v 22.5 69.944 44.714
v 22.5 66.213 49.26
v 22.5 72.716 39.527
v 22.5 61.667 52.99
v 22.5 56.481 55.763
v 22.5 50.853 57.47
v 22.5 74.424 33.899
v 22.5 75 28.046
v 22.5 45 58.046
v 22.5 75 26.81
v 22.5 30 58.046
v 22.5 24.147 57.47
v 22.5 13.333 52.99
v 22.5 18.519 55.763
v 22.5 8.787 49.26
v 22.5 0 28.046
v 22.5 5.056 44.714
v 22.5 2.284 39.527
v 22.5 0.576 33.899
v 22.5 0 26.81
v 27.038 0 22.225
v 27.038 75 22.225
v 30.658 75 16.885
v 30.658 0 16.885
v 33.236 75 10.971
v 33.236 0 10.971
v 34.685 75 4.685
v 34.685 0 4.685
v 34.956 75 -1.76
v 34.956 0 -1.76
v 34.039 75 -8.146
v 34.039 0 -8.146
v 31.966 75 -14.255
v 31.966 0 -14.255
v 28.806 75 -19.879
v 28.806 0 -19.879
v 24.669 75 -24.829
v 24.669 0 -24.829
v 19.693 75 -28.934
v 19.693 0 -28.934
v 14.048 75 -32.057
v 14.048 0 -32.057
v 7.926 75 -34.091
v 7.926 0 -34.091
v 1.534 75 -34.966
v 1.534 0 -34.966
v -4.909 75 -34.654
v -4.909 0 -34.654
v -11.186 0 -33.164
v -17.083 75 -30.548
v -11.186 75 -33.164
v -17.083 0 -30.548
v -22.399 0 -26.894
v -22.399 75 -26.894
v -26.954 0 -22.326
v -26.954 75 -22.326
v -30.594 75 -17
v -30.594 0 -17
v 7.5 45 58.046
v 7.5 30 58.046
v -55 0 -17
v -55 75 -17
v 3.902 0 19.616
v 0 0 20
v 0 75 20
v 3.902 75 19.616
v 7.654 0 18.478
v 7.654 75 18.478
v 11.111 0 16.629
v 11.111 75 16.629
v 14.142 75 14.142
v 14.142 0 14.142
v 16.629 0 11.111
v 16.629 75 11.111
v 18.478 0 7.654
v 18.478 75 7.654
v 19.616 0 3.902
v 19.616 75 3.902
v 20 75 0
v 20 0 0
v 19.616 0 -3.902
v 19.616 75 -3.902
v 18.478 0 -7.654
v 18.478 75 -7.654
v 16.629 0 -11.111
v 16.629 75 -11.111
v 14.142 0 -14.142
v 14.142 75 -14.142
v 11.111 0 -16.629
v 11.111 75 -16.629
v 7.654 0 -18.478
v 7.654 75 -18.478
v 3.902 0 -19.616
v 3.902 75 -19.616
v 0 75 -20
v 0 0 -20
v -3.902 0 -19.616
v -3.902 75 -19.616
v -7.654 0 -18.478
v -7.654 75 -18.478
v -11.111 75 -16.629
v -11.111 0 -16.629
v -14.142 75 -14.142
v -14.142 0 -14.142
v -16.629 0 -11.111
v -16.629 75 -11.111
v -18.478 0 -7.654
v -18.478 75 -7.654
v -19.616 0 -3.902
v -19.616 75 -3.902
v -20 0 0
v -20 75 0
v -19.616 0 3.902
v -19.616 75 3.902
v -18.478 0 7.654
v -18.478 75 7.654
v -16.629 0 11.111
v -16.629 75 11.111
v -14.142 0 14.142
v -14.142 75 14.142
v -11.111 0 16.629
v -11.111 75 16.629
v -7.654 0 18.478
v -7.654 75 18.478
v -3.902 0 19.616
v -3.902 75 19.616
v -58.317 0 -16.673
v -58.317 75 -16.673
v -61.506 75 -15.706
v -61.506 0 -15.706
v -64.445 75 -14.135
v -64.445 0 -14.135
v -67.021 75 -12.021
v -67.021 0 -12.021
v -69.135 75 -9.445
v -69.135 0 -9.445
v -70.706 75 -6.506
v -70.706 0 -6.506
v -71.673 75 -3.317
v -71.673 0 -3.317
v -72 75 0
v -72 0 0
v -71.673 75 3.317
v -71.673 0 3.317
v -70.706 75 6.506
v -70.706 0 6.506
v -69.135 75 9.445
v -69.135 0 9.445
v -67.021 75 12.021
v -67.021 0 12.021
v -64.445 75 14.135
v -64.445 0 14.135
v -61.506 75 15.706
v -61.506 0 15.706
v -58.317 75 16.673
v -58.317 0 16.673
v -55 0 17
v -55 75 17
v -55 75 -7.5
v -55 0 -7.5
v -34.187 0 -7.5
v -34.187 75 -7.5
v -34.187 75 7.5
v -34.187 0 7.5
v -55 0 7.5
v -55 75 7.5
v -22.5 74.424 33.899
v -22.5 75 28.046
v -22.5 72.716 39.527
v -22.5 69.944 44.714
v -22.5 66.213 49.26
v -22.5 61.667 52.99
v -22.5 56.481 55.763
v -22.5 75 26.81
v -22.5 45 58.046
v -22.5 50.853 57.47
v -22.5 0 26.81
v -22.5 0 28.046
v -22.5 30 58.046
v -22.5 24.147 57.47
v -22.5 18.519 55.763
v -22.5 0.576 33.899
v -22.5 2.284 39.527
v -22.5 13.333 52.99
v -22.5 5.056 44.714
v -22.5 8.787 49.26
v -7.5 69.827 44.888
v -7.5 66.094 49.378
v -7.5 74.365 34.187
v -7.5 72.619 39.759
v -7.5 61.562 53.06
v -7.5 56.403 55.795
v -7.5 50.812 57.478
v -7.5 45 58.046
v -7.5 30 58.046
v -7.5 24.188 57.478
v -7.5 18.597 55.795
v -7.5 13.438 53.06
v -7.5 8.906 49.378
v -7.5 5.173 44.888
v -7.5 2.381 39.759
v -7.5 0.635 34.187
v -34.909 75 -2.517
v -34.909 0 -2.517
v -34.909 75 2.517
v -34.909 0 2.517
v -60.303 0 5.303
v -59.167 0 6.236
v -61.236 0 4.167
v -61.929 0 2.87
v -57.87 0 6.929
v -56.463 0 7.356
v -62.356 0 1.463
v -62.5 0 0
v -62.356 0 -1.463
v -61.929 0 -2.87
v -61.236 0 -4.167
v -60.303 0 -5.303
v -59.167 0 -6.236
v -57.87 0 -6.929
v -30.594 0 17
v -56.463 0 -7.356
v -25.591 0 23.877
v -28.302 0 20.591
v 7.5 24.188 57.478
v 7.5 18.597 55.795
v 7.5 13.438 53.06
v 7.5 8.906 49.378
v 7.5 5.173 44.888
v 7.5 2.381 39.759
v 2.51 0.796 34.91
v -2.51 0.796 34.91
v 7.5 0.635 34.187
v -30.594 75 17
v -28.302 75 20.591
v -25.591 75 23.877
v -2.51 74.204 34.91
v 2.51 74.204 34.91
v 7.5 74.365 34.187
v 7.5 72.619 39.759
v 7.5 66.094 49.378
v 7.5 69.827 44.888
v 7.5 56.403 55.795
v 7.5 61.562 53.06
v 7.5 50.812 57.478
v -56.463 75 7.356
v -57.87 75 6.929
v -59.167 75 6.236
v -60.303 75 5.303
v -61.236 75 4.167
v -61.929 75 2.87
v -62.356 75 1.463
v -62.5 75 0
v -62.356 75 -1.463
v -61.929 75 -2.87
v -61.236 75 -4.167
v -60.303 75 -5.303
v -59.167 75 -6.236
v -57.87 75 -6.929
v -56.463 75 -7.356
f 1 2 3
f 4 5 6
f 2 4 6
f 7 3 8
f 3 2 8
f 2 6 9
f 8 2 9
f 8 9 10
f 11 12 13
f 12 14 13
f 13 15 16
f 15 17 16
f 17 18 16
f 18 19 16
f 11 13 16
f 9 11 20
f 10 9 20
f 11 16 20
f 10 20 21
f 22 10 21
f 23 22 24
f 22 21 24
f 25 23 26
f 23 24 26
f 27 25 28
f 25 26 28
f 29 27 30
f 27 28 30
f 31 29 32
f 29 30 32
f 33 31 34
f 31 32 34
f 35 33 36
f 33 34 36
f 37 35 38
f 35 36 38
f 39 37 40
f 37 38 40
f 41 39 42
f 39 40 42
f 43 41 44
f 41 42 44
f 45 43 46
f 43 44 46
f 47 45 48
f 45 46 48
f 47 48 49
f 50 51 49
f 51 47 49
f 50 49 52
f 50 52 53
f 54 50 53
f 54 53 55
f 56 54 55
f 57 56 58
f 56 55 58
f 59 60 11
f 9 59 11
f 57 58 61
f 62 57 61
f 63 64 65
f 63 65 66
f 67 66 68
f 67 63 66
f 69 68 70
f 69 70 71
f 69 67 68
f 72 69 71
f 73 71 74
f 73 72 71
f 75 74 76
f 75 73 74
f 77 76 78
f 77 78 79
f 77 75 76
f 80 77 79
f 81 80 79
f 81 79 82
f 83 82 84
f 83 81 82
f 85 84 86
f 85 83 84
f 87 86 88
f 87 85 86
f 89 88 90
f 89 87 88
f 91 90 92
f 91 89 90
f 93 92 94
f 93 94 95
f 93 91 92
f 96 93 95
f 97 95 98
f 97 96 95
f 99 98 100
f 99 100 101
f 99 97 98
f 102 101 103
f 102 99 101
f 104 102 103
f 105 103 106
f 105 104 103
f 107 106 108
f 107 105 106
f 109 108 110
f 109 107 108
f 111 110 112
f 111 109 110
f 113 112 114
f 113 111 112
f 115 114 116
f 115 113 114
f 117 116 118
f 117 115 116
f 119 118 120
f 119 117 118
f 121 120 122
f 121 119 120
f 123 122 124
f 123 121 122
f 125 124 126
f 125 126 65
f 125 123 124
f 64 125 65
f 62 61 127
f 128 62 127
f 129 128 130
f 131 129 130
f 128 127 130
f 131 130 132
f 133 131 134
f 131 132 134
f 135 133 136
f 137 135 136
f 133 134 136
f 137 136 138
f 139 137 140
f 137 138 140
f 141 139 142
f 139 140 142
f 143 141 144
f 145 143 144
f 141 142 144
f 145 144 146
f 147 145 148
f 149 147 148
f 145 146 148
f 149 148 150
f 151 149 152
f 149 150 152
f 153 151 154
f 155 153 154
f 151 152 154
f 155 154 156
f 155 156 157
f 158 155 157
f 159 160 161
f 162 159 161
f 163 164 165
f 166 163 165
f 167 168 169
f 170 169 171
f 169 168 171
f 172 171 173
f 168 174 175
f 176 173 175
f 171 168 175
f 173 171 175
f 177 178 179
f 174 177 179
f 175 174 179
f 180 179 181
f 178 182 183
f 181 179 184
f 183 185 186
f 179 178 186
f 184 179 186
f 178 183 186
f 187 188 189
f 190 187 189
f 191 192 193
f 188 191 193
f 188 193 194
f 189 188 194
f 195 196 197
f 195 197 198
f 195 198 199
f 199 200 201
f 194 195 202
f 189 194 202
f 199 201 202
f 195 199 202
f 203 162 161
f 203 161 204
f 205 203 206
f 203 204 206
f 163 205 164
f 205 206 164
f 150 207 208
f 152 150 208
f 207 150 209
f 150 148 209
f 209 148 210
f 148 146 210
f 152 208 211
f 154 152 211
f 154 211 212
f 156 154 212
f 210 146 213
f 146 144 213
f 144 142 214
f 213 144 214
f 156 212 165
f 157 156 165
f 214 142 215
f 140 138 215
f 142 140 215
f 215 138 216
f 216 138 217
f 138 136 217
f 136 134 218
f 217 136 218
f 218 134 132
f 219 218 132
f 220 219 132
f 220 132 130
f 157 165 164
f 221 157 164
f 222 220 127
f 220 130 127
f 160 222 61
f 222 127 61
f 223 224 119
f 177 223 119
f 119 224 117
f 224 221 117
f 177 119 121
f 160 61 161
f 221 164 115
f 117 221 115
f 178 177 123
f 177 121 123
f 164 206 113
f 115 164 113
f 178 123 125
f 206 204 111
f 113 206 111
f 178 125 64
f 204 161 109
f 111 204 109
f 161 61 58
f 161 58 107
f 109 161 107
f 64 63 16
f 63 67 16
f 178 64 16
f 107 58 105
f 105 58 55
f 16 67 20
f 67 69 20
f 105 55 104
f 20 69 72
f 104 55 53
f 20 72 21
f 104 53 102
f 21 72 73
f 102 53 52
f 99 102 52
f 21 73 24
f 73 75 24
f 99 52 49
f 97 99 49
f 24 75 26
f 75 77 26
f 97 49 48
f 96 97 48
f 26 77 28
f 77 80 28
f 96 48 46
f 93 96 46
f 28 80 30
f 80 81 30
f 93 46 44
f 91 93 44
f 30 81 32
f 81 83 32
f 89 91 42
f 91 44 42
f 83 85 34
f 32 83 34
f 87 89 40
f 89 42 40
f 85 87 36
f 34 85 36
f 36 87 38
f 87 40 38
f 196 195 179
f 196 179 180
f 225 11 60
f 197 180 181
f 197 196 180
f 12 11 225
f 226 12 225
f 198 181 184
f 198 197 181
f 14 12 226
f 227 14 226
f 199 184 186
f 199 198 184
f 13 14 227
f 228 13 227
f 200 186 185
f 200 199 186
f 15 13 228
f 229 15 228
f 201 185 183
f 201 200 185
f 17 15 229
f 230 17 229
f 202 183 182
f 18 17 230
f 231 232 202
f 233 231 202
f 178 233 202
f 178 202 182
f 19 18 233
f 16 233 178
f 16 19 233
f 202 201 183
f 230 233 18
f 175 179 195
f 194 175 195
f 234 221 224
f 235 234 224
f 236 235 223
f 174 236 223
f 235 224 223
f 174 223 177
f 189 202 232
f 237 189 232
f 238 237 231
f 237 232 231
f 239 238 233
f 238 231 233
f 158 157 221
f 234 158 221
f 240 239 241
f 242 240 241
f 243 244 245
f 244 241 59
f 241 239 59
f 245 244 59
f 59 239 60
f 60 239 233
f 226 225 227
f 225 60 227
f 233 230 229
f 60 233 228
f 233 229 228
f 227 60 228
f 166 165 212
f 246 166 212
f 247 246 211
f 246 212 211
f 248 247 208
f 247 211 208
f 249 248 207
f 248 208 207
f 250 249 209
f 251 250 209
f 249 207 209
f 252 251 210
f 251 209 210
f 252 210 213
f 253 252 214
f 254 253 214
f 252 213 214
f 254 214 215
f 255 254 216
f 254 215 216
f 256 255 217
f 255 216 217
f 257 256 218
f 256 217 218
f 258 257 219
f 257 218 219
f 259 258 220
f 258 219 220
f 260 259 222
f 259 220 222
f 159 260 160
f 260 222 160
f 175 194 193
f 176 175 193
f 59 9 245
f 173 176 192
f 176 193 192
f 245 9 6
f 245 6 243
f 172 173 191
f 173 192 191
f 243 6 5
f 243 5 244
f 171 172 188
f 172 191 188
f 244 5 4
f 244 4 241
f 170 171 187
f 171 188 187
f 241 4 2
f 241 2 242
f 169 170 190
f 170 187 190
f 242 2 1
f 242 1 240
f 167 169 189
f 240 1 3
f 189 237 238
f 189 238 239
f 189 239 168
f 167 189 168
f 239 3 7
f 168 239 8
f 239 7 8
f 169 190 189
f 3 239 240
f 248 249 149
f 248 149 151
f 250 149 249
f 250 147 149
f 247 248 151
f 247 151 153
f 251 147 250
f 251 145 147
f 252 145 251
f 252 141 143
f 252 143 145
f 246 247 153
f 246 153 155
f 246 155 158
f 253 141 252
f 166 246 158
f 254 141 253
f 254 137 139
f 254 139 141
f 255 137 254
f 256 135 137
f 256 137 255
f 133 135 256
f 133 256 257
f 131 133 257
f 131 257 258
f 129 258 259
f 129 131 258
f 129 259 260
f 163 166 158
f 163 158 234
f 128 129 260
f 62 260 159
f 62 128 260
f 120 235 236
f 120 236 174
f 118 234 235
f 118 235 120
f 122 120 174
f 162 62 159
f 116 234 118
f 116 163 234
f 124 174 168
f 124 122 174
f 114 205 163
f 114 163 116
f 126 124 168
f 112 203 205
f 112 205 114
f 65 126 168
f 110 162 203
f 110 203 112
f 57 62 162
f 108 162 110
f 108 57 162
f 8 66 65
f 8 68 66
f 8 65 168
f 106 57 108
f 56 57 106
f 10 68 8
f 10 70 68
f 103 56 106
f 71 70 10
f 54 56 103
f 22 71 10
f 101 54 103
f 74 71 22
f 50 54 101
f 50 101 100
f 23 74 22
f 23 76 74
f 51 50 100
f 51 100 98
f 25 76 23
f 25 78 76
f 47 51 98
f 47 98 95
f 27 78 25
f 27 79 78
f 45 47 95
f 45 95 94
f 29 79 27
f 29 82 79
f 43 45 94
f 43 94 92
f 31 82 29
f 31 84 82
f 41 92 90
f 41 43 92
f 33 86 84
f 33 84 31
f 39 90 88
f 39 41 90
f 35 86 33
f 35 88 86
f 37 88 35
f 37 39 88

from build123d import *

# Parameters (mm, degrees)
SKETCH1_R           = 35
SKETCH1_R_2         = 20
BOSS_EXTRUDE6_DEPTH = 75
FILLET1_R           = 30


with BuildPart() as part:
    # Sketch1 → Boss-Extrude6 (new body)
    # profile 1 of 4: a face of its own
    with BuildSketch(Plane(origin=(0, 0, 0), x_dir=(1, 0, 0), z_dir=(0, 1, 0))):
        with BuildLine():
            ThreePointArc((-7.5, -34.186985828), (-15.446901808, -31.406897722), (-22.5, -26.809513237))
            Line((-22.5, -26.809513237), (-22.5, -58.046407186))
            Line((-22.5, -58.046407186), (-7.5, -58.046407186))
            Line((-7.5, -58.046407186), (-7.5, -34.186985828))
        make_face()
    # profile 2 of 4: a face of its own
    with BuildSketch(Plane(origin=(0, 0, 0), x_dir=(1, 0, 0), z_dir=(0, 1, 0))):
        with BuildLine():
            Line((22.5, -58.046407186), (22.5, -26.809513237))
            ThreePointArc((22.5, -26.809513237), (15.446901808, -31.406897722), (7.5, -34.186985828))
            Line((7.5, -34.186985828), (7.5, -58.046407186))
            Line((7.5, -58.046407186), (22.5, -58.046407186))
        make_face()
    # profile 3 of 4: a face of its own
    with BuildSketch(Plane(origin=(0, 0, 0), x_dir=(1, 0, 0), z_dir=(0, 1, 0))):
        Circle(SKETCH1_R)
        with Locations(Location((0, 0, 0), (0, 0, 270))):
            Circle(SKETCH1_R_2, mode=Mode.SUBTRACT)
    # profile 4 of 4: a face of its own
    with BuildSketch(Plane(origin=(0, 0, 0), x_dir=(1, 0, 0), z_dir=(0, 1, 0))):
        with BuildLine():
            ThreePointArc((-55, -7.5), (-62.5, 0), (-55, 7.5))
            Line((-55, 7.5), (-34.186985828, 7.5))
            ThreePointArc((-34.186985828, 7.5), (-32.736987087, 12.381020816), (-30.594117082, 17))
            Line((-30.594117082, 17), (-55, 17))
            ThreePointArc((-55, 17), (-72, 0), (-55, -17))
            Line((-55, -17), (-30.594117082, -17))
            ThreePointArc((-30.594117082, -17), (-32.736987087, -12.381020816), (-34.186985828, -7.5))
            Line((-34.186985828, -7.5), (-55, -7.5))
        make_face()
    extrude(amount=BOSS_EXTRUDE6_DEPTH)

    # Fillet1
    fillet1_edges = [part.edges().sort_by_distance(p)[0] for p in [
        (-15, 0, 58.046407186),
        (-15, 75, 58.046407186),
    ]]
    fillet(fillet1_edges, radius=FILLET1_R)


solid = part.part
